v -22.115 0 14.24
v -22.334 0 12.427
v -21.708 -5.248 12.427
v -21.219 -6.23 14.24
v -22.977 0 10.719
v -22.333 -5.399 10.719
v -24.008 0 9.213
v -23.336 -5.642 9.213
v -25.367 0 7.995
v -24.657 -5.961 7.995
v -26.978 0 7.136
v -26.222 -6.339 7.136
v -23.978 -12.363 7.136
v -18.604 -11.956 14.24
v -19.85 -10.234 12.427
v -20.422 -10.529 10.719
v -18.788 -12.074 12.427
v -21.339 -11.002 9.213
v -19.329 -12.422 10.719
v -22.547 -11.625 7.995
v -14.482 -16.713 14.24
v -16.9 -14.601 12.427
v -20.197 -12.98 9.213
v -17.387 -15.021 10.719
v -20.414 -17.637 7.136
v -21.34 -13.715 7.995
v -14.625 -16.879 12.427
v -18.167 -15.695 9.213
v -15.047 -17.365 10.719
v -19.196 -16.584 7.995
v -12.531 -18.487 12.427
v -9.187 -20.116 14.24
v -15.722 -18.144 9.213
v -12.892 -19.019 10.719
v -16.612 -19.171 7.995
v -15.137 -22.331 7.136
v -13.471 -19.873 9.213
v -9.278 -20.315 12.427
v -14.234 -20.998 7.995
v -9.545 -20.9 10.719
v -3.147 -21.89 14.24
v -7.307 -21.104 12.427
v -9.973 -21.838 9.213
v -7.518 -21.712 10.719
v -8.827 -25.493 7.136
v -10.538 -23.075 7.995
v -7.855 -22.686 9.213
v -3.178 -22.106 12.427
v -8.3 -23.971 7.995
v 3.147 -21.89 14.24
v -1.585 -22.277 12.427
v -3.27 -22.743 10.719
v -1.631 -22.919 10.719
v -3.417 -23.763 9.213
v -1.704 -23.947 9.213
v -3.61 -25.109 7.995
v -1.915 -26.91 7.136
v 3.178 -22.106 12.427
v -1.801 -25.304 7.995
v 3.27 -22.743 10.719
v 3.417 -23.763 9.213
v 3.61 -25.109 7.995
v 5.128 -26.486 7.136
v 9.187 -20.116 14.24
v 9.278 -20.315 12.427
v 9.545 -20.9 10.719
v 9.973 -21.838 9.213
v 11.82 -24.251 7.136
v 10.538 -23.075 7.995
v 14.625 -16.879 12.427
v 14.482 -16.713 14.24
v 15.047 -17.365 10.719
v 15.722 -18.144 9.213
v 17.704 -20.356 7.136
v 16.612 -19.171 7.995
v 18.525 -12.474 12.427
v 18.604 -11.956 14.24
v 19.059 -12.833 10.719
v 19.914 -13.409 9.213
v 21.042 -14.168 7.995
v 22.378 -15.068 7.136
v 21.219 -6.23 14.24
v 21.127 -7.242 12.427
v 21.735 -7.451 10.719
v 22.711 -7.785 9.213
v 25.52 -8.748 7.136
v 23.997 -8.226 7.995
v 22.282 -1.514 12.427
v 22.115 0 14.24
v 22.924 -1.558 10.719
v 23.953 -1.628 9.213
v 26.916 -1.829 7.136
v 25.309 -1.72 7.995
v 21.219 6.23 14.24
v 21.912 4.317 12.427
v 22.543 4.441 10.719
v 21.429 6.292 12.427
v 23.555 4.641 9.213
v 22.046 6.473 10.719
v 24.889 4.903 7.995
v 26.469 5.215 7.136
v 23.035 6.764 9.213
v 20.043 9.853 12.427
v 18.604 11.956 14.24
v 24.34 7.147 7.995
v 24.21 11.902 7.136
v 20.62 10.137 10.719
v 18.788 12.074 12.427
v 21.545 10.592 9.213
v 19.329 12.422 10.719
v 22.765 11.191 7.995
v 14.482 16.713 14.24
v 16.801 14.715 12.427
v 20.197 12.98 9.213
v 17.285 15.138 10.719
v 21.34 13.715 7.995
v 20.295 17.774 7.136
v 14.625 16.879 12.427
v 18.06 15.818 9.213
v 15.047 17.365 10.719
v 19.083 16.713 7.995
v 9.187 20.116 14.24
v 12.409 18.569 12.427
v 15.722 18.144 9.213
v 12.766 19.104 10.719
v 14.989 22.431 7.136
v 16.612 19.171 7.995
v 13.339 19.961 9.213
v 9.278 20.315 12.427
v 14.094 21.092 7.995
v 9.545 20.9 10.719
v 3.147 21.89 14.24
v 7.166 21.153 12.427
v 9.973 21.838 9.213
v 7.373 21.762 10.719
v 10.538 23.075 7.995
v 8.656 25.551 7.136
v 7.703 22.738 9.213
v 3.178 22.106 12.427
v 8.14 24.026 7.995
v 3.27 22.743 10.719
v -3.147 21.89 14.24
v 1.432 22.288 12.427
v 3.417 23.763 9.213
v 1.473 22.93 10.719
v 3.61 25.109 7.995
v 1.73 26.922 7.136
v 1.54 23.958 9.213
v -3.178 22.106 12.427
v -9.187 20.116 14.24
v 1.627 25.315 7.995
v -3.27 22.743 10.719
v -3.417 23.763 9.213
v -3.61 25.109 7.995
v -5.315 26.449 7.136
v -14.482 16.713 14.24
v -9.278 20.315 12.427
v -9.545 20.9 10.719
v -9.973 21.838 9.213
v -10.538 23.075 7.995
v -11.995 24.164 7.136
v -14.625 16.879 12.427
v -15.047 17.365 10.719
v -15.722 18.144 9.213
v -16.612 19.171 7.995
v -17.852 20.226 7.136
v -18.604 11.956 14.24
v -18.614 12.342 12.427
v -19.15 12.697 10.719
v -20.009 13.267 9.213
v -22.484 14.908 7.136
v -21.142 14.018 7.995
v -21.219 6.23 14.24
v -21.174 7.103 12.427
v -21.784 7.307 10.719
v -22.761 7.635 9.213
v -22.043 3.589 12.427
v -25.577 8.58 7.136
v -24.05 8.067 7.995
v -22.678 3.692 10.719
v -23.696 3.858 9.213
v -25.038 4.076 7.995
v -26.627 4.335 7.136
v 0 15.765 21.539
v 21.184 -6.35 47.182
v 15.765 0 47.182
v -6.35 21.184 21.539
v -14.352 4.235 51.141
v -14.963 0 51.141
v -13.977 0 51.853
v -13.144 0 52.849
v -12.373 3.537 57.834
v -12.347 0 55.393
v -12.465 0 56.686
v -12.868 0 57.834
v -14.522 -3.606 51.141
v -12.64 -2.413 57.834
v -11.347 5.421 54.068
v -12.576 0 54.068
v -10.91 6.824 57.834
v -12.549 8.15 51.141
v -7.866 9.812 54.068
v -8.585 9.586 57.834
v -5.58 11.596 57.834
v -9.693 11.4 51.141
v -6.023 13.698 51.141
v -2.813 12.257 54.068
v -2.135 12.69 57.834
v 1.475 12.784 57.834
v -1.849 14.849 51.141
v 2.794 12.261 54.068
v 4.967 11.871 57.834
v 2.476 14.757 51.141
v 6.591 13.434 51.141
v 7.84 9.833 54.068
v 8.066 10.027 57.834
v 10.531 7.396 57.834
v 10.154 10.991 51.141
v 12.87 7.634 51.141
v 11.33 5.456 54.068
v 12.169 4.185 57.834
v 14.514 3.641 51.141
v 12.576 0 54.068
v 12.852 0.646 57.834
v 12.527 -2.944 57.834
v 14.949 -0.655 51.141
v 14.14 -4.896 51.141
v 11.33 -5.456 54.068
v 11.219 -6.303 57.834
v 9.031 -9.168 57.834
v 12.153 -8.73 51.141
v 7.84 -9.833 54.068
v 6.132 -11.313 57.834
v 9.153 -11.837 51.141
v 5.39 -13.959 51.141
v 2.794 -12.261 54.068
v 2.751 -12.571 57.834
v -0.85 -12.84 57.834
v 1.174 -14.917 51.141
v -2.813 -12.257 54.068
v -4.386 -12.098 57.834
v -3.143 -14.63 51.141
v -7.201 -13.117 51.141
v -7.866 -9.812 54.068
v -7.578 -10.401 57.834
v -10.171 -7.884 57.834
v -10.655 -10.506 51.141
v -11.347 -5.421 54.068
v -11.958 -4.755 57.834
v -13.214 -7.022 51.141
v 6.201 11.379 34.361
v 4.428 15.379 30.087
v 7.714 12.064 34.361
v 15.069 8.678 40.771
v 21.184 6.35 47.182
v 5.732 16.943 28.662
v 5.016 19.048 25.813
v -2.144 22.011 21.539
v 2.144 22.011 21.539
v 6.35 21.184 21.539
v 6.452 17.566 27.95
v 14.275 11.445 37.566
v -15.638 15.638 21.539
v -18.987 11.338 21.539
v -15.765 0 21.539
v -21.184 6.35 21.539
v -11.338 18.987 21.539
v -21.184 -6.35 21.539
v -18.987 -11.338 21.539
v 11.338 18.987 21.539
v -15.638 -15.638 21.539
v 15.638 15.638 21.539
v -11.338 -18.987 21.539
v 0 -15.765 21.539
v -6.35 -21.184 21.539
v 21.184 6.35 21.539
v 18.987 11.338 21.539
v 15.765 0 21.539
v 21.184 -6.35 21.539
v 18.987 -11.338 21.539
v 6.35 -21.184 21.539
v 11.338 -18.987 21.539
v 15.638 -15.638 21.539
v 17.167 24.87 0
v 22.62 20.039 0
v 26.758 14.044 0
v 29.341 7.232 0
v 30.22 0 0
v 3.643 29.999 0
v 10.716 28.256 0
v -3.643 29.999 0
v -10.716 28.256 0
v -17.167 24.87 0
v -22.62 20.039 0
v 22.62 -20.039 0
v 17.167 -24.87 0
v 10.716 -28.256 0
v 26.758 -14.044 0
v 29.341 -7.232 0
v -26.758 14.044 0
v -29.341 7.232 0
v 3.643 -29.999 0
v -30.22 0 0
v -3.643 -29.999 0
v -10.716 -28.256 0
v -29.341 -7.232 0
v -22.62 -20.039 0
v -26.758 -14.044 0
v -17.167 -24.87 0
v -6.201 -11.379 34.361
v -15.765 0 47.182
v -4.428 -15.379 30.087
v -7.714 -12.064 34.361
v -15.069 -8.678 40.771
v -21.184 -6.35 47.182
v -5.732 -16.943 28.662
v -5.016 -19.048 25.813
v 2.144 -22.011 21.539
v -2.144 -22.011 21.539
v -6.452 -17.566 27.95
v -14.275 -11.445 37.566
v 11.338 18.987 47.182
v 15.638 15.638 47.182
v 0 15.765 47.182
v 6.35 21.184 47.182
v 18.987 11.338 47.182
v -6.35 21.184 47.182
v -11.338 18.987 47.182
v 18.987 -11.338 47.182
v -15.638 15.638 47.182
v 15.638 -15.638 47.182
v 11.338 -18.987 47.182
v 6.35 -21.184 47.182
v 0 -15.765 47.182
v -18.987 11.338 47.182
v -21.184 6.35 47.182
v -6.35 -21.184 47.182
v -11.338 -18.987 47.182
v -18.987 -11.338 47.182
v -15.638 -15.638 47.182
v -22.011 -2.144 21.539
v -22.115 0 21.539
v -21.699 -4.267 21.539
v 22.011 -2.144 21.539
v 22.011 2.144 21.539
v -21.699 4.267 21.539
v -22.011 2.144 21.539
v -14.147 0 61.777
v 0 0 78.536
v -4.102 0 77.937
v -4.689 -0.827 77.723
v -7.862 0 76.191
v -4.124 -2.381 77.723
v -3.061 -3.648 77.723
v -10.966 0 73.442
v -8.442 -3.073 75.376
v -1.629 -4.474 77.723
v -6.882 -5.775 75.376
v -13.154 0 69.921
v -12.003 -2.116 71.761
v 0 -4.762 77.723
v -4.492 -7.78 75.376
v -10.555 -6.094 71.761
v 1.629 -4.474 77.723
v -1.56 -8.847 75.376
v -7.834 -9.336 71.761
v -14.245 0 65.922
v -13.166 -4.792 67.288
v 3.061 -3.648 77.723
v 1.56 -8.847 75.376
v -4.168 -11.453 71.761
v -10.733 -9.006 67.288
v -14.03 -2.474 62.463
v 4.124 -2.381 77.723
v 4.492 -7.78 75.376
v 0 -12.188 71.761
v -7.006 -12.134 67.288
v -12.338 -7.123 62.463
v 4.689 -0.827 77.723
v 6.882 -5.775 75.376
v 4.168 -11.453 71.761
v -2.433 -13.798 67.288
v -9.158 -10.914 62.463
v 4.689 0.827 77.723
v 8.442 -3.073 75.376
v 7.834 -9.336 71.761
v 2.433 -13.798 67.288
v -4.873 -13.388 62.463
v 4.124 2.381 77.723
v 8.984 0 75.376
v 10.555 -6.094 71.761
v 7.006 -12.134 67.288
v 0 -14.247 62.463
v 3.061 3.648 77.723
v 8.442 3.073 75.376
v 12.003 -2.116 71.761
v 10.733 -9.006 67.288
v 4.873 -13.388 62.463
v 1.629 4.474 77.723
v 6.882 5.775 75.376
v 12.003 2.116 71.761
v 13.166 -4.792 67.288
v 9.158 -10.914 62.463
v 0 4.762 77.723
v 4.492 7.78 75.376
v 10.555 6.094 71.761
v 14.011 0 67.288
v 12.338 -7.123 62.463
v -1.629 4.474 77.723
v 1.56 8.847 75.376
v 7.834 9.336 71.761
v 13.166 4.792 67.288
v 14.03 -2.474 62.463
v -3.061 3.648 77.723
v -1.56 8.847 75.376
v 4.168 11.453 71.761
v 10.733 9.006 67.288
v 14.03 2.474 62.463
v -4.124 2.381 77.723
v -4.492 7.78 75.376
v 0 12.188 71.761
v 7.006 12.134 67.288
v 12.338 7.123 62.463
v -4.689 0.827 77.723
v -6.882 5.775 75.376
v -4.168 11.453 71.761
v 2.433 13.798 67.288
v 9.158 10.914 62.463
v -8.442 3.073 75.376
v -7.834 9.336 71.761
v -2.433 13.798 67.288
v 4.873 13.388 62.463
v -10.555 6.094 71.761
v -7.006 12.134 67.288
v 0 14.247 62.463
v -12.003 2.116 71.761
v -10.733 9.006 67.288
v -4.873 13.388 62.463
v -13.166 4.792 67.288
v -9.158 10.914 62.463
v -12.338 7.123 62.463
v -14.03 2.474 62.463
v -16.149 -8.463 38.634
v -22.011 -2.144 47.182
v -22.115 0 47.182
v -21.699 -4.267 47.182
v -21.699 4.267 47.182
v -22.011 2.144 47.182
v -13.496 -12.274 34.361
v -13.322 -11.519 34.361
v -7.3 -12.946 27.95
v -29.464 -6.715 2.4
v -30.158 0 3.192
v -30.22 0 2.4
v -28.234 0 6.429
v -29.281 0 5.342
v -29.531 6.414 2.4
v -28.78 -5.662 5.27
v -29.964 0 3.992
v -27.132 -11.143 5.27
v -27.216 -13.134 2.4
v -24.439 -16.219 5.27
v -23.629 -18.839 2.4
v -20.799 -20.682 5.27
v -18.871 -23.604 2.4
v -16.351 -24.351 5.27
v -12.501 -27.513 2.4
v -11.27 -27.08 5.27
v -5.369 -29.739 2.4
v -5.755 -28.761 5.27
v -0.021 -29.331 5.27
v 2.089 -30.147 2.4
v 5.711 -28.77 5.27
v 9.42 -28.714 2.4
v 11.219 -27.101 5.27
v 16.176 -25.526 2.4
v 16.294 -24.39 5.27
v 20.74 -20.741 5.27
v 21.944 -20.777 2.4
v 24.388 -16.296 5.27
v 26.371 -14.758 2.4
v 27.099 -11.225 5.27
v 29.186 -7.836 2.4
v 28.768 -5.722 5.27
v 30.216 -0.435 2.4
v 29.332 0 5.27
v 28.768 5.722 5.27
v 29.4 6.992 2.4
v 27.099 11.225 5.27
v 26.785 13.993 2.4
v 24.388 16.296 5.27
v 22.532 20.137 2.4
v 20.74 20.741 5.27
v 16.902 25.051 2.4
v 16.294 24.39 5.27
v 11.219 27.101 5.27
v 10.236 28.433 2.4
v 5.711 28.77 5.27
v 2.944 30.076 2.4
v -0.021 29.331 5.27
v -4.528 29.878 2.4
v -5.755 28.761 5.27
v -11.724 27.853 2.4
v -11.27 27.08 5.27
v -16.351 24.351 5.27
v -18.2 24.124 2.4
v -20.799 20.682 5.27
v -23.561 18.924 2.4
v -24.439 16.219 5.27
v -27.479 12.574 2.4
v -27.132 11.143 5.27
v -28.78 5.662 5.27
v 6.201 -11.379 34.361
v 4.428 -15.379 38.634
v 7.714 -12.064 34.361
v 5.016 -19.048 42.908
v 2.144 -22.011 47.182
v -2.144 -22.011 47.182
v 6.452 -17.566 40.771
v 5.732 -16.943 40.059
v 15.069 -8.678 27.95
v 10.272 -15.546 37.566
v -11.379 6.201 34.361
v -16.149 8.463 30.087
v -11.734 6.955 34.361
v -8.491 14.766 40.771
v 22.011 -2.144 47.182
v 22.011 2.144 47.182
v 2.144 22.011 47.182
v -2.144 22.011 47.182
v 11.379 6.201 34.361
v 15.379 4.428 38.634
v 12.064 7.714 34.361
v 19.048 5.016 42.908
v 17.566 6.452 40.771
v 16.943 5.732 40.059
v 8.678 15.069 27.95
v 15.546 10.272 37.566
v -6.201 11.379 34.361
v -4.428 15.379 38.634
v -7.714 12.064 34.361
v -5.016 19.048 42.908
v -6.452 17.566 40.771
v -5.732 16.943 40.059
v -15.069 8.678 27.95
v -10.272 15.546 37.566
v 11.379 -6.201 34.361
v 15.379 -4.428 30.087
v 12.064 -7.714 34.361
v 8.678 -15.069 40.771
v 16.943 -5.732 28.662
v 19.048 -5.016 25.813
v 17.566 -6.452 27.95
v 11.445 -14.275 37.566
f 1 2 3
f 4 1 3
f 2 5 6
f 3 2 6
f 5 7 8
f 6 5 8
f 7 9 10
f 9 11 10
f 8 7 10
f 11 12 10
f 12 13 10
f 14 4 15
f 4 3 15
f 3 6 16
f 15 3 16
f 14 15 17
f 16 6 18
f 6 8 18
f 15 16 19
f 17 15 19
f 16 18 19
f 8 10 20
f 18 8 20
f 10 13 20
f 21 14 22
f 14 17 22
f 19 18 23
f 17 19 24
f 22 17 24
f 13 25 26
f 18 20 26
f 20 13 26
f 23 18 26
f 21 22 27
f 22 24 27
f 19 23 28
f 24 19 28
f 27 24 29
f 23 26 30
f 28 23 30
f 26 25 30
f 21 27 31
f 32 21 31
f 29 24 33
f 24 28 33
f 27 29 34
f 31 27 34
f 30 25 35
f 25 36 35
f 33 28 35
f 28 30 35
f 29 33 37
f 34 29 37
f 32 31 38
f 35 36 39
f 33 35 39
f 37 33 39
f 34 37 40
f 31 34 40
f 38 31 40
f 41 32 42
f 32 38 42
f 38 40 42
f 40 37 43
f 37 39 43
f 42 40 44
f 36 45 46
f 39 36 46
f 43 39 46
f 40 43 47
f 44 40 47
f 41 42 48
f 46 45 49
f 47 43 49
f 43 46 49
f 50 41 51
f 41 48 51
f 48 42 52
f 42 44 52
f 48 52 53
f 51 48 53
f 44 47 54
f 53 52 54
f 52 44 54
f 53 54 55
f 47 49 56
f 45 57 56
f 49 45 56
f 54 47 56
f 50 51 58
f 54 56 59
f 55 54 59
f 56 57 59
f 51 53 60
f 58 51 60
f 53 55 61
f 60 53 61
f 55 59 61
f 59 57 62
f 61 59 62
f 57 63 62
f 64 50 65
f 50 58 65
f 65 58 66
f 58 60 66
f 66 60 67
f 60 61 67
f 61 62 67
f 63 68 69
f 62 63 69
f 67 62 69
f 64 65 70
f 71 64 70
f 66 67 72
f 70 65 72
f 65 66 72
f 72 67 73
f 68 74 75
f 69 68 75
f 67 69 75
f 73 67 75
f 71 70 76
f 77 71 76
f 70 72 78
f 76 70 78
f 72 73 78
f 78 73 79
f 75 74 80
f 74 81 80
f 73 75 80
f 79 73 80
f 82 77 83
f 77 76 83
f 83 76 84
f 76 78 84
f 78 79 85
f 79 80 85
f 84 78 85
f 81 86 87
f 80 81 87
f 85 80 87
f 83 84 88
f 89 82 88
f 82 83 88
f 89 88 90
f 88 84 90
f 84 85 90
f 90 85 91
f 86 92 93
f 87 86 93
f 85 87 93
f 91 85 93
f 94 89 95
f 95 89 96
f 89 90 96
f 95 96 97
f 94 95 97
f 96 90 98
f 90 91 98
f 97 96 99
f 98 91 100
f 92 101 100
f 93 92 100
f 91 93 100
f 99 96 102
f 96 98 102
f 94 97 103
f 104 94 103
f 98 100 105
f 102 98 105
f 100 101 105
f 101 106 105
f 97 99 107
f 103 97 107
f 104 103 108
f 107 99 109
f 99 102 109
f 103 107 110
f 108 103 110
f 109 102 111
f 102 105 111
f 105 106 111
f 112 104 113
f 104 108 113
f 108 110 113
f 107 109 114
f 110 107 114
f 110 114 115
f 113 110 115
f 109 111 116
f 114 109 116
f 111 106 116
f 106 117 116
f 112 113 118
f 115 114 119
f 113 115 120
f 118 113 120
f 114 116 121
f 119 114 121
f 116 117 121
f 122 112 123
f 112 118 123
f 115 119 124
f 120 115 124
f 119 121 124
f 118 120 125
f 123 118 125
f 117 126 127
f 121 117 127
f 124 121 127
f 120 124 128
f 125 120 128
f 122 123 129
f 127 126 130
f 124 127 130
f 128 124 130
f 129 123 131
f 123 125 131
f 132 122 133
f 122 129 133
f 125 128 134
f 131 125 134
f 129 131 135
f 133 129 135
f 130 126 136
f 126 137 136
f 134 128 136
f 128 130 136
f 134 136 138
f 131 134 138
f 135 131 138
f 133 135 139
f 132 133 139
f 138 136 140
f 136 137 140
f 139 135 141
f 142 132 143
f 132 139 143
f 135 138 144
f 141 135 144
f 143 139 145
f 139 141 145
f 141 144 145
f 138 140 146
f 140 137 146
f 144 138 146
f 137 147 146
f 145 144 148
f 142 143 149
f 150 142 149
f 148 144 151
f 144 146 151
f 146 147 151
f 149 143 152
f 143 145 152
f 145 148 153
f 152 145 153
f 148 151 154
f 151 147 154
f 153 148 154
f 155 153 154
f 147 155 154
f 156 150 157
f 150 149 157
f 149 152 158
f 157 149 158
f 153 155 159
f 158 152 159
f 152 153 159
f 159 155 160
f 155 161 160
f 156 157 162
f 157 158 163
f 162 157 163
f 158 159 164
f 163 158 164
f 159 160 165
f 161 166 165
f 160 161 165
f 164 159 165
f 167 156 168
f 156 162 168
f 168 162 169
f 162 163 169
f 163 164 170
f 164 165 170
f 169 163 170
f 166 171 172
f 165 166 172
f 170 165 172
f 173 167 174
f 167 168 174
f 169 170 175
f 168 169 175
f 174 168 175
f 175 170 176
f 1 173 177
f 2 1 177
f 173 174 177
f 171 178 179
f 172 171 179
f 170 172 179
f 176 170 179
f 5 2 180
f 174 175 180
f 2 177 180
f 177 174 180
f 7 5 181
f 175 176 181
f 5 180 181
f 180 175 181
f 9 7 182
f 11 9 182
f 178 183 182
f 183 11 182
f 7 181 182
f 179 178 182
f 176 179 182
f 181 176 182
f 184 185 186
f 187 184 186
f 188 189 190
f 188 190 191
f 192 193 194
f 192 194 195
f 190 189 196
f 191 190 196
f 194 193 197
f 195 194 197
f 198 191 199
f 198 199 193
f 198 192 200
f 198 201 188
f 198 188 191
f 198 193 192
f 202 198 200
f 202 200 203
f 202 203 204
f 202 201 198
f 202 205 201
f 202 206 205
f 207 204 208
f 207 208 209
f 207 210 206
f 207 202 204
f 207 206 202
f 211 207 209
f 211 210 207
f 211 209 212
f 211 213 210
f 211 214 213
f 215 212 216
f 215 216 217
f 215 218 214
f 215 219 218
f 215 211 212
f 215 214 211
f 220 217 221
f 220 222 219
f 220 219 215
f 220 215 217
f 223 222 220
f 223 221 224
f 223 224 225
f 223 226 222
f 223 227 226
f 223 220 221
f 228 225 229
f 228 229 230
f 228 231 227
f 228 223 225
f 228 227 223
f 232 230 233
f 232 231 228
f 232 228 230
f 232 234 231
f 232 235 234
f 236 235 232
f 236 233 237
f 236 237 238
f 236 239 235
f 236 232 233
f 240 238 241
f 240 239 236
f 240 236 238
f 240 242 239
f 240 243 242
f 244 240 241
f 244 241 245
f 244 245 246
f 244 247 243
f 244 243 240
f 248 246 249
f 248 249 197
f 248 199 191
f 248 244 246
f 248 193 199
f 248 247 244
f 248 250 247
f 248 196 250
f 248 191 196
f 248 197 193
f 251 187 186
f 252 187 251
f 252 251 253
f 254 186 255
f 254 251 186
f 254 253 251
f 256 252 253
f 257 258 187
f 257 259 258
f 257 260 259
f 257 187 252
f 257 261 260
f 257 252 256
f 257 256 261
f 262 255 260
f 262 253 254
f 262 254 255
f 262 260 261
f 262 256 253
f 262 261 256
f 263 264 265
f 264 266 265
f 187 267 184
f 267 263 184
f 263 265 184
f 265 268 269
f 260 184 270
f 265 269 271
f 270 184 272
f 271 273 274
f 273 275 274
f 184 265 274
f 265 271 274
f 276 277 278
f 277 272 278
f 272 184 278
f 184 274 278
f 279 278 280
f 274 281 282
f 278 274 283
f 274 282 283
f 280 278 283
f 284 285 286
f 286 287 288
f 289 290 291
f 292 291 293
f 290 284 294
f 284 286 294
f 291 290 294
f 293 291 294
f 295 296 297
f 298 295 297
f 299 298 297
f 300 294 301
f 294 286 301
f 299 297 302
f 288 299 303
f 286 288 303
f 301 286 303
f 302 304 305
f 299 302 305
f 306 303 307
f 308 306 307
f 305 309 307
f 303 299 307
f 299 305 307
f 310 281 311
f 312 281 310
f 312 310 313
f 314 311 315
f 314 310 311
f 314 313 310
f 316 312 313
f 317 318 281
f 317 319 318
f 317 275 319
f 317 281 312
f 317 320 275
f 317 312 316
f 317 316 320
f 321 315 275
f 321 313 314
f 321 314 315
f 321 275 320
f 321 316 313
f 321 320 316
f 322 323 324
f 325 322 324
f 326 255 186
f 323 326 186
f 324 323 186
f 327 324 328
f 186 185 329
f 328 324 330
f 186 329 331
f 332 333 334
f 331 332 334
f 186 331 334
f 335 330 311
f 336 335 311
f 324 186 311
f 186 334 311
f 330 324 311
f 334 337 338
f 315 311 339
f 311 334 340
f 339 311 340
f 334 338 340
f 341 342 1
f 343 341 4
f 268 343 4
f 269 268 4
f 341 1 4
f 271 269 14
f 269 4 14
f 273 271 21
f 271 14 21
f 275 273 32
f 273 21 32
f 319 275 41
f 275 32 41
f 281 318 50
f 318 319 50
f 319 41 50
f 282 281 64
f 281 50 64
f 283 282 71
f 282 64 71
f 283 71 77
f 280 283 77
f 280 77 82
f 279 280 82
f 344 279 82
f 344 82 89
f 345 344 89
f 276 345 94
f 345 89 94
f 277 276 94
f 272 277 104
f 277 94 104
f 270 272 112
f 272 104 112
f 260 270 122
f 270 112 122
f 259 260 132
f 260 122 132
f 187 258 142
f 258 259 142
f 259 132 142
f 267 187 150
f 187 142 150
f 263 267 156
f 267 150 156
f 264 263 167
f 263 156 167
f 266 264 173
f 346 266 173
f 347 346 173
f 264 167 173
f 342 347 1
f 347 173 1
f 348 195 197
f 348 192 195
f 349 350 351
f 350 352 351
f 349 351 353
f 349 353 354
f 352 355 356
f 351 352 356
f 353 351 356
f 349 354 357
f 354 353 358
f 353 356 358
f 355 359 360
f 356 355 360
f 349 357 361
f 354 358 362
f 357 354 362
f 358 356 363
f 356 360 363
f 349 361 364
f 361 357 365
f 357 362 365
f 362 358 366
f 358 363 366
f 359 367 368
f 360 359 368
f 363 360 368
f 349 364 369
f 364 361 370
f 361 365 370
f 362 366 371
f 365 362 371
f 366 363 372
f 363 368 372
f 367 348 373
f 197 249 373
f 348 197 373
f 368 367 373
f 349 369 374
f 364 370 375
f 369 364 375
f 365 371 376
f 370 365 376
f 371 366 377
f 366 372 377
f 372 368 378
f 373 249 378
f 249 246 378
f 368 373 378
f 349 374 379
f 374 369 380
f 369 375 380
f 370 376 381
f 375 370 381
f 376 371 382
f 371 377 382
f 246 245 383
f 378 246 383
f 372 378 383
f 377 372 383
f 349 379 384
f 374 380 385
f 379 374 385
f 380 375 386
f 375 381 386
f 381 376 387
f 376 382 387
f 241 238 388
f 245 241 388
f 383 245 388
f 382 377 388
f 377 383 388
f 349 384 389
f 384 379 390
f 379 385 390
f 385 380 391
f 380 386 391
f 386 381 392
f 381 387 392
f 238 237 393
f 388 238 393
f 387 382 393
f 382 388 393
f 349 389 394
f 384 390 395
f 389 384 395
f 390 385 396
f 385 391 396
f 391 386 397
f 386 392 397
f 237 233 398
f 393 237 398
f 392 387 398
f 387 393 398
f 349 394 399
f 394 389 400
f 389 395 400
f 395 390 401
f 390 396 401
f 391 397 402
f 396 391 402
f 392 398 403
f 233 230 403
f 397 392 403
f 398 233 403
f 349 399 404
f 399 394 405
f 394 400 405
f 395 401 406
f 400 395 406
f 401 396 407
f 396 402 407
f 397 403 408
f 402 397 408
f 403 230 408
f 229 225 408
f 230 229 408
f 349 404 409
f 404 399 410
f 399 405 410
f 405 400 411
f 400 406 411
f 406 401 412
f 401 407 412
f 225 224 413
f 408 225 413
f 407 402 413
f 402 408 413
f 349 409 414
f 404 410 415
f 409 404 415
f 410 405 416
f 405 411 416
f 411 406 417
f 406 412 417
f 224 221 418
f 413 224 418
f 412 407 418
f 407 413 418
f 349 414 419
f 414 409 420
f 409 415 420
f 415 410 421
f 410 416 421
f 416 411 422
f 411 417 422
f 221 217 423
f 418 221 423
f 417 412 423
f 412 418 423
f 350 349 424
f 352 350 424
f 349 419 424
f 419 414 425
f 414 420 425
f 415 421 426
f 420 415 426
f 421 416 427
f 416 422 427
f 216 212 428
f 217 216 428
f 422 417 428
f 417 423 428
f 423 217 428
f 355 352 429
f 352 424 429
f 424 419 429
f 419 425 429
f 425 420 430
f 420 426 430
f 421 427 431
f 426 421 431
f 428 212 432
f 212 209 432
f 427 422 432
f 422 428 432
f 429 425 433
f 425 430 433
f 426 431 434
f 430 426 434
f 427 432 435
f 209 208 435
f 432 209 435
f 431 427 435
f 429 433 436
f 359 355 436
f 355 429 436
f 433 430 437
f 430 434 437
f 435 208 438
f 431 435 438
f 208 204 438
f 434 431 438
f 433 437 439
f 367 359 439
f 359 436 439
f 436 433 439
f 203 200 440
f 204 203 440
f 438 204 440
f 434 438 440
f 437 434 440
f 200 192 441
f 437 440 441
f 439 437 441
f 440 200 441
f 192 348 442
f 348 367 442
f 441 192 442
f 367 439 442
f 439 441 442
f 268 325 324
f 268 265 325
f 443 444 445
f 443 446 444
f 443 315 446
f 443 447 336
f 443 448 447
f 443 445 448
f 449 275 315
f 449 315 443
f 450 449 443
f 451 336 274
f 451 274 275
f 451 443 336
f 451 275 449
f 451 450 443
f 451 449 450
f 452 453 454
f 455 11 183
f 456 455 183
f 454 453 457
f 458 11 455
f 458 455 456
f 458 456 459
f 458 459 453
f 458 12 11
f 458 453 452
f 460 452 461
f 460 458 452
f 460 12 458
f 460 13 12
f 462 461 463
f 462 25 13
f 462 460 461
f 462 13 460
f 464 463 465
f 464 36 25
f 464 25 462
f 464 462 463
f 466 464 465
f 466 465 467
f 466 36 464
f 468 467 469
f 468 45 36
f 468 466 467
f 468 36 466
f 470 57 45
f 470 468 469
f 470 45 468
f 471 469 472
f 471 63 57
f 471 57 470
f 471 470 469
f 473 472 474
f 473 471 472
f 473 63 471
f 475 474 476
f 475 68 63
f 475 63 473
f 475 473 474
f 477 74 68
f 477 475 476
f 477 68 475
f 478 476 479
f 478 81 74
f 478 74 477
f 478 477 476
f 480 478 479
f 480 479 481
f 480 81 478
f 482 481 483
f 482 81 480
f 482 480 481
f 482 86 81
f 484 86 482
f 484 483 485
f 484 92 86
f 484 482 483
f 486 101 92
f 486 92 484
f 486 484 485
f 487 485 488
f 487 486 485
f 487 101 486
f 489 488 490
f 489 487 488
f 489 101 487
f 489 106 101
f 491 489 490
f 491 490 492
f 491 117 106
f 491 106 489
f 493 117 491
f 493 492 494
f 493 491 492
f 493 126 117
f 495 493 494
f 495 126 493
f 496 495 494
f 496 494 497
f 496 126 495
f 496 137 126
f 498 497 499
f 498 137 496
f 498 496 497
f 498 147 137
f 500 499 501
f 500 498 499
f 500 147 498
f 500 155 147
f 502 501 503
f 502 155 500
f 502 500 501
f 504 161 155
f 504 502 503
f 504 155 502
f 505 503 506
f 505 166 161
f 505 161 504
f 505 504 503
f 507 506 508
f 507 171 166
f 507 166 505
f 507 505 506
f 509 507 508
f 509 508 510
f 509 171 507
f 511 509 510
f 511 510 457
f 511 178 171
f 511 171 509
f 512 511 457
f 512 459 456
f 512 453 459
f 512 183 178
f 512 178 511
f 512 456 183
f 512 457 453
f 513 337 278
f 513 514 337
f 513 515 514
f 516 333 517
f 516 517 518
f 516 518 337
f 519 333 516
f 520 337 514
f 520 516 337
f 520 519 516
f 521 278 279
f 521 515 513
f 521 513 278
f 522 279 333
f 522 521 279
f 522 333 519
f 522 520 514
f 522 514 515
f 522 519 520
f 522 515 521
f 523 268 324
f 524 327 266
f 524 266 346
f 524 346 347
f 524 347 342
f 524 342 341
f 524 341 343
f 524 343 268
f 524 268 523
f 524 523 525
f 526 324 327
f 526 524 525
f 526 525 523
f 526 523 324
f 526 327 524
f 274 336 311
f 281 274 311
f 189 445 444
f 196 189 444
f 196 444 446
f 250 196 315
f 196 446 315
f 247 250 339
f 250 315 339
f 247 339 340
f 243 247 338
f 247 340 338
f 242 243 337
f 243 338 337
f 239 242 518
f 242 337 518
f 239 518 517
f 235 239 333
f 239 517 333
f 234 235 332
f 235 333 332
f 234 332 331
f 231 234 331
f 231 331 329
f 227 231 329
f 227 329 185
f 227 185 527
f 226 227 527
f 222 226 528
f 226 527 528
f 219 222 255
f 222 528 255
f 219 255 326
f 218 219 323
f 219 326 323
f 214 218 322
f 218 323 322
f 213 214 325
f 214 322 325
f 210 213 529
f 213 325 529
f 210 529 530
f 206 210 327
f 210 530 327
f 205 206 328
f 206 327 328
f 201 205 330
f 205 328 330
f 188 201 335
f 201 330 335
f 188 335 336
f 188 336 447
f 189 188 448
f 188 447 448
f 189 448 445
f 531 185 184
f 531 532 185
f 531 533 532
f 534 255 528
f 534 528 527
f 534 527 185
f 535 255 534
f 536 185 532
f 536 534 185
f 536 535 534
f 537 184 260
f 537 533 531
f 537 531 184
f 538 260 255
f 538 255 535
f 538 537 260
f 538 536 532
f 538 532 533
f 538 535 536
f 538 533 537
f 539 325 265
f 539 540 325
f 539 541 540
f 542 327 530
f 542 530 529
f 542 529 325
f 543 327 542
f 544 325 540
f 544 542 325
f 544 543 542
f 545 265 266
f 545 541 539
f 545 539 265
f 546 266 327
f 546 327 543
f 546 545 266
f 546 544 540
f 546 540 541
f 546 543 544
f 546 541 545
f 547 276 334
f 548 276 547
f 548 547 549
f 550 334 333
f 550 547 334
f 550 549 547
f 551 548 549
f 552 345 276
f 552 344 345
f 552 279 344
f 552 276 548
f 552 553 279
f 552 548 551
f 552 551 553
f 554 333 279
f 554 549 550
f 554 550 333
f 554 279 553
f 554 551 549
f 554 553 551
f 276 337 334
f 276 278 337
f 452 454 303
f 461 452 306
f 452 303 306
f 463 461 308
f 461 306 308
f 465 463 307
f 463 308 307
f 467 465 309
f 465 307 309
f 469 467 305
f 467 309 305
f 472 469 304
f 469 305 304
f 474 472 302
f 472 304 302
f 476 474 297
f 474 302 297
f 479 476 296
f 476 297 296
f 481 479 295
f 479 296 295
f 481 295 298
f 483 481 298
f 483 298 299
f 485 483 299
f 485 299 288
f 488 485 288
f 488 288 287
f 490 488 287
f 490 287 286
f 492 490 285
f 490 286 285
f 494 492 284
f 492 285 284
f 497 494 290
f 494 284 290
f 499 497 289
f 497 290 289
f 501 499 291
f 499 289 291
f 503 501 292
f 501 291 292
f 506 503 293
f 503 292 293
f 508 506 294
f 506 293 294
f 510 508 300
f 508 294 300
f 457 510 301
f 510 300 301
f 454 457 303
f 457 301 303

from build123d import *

# Parameters (mm, degrees)
F5_COUNT = 4
F6_R     = 7.62
F7_R     = 5.08
F8_R     = 5.08


with BuildPart() as f1:
    # F0 (on Front) → F1 (revolve)
    with BuildSketch(Plane.XZ):
        Polygon((-30.2196051925, 0), (0, 0), (0, 21.5392599132), (-22.1149149458, 21.5392599132), (-22.1149149458, 6.6195321269), (-30.2196051925, 6.6195321269), align=None)
    revolve(axis=Axis((0, 0, 62.8589570214), (0, 0, 1)))



with BuildPart() as f1b:
    # F0 (on Front) → F1, piece 2 (revolve)
    with BuildSketch(Plane.XZ):
        with BuildLine():
            Line((-22.1149149458, 47.1819389861), (0, 47.1819389861))
            Line((0, 47.1819389861), (0, 78.5359750567))
            ThreePointArc((0, 78.5359750567), (-13.2981646967, 69.5796959287), (-9.9974415372, 53.8901660841))
            Line((-9.9974415372, 53.8901660841), (-22.1149149458, 47.1819389861))
        make_face()
    revolve(axis=Axis((0, 0, 62.8589570214), (0, 0, 1)))


with BuildPart() as f1_1:
    add(f1.part)

    add(f1b.part)  # F4 merges F1b
    # F3 (on face) → F4 section 0
    with BuildSketch(Plane(origin=(0, 0, 47.1819389861), x_dir=(1, 0, 0), z_dir=(0, 0, -1))):
        with BuildLine():
            Line((-15.7649149458, 0), (-21.1836484832, 6.35))
            ThreePointArc((-21.1836484832, 6.35), (-22.1149149458, 0), (-21.1836484832, -6.35))
            Line((-21.1836484832, -6.35), (-15.7649149458, 0))
        make_face()
    # F2 (on face) → F4 section 1
    with BuildSketch(Plane.XY.offset(21.5392599132)):
        with BuildLine():
            Line((0, -15.7649149458), (-6.35, -21.1836484832))
            ThreePointArc((-6.35, -21.1836484832), (0, -22.1149149458), (6.35, -21.1836484832))
            Line((6.35, -21.1836484832), (0, -15.7649149458))
        make_face()
    loft()

    # F5: F1 ×4 about axis
    f5_axis = Axis((0, 0, 21.5392599132), (0, 0, 1))


with BuildPart() as f1_2:
    add(f1_1.part)
    for i in range(1, F5_COUNT):
        add(f1_1.part.rotate(f5_axis, i * 360 / F5_COUNT))

    # F6
    f6_edges = [f1_2.edges().sort_by_distance(p)[0] for p in [
        (22.114915, 0, 6.619532),
    ]]
    fillet(f6_edges, radius=F6_R)

    # F7
    f7_edges = [f1_2.edges().sort_by_distance(p)[0] for p in [
        (30.219605, 0, 6.619532),
    ]]
    fillet(f7_edges, radius=F7_R)

    # F8
    f8_edges = [f1_2.edges().sort_by_distance(p)[0] for p in [
        (9.997442, 0, 53.890166),
    ]]
    fillet(f8_edges, radius=F8_R)


solid = f1_2.part
